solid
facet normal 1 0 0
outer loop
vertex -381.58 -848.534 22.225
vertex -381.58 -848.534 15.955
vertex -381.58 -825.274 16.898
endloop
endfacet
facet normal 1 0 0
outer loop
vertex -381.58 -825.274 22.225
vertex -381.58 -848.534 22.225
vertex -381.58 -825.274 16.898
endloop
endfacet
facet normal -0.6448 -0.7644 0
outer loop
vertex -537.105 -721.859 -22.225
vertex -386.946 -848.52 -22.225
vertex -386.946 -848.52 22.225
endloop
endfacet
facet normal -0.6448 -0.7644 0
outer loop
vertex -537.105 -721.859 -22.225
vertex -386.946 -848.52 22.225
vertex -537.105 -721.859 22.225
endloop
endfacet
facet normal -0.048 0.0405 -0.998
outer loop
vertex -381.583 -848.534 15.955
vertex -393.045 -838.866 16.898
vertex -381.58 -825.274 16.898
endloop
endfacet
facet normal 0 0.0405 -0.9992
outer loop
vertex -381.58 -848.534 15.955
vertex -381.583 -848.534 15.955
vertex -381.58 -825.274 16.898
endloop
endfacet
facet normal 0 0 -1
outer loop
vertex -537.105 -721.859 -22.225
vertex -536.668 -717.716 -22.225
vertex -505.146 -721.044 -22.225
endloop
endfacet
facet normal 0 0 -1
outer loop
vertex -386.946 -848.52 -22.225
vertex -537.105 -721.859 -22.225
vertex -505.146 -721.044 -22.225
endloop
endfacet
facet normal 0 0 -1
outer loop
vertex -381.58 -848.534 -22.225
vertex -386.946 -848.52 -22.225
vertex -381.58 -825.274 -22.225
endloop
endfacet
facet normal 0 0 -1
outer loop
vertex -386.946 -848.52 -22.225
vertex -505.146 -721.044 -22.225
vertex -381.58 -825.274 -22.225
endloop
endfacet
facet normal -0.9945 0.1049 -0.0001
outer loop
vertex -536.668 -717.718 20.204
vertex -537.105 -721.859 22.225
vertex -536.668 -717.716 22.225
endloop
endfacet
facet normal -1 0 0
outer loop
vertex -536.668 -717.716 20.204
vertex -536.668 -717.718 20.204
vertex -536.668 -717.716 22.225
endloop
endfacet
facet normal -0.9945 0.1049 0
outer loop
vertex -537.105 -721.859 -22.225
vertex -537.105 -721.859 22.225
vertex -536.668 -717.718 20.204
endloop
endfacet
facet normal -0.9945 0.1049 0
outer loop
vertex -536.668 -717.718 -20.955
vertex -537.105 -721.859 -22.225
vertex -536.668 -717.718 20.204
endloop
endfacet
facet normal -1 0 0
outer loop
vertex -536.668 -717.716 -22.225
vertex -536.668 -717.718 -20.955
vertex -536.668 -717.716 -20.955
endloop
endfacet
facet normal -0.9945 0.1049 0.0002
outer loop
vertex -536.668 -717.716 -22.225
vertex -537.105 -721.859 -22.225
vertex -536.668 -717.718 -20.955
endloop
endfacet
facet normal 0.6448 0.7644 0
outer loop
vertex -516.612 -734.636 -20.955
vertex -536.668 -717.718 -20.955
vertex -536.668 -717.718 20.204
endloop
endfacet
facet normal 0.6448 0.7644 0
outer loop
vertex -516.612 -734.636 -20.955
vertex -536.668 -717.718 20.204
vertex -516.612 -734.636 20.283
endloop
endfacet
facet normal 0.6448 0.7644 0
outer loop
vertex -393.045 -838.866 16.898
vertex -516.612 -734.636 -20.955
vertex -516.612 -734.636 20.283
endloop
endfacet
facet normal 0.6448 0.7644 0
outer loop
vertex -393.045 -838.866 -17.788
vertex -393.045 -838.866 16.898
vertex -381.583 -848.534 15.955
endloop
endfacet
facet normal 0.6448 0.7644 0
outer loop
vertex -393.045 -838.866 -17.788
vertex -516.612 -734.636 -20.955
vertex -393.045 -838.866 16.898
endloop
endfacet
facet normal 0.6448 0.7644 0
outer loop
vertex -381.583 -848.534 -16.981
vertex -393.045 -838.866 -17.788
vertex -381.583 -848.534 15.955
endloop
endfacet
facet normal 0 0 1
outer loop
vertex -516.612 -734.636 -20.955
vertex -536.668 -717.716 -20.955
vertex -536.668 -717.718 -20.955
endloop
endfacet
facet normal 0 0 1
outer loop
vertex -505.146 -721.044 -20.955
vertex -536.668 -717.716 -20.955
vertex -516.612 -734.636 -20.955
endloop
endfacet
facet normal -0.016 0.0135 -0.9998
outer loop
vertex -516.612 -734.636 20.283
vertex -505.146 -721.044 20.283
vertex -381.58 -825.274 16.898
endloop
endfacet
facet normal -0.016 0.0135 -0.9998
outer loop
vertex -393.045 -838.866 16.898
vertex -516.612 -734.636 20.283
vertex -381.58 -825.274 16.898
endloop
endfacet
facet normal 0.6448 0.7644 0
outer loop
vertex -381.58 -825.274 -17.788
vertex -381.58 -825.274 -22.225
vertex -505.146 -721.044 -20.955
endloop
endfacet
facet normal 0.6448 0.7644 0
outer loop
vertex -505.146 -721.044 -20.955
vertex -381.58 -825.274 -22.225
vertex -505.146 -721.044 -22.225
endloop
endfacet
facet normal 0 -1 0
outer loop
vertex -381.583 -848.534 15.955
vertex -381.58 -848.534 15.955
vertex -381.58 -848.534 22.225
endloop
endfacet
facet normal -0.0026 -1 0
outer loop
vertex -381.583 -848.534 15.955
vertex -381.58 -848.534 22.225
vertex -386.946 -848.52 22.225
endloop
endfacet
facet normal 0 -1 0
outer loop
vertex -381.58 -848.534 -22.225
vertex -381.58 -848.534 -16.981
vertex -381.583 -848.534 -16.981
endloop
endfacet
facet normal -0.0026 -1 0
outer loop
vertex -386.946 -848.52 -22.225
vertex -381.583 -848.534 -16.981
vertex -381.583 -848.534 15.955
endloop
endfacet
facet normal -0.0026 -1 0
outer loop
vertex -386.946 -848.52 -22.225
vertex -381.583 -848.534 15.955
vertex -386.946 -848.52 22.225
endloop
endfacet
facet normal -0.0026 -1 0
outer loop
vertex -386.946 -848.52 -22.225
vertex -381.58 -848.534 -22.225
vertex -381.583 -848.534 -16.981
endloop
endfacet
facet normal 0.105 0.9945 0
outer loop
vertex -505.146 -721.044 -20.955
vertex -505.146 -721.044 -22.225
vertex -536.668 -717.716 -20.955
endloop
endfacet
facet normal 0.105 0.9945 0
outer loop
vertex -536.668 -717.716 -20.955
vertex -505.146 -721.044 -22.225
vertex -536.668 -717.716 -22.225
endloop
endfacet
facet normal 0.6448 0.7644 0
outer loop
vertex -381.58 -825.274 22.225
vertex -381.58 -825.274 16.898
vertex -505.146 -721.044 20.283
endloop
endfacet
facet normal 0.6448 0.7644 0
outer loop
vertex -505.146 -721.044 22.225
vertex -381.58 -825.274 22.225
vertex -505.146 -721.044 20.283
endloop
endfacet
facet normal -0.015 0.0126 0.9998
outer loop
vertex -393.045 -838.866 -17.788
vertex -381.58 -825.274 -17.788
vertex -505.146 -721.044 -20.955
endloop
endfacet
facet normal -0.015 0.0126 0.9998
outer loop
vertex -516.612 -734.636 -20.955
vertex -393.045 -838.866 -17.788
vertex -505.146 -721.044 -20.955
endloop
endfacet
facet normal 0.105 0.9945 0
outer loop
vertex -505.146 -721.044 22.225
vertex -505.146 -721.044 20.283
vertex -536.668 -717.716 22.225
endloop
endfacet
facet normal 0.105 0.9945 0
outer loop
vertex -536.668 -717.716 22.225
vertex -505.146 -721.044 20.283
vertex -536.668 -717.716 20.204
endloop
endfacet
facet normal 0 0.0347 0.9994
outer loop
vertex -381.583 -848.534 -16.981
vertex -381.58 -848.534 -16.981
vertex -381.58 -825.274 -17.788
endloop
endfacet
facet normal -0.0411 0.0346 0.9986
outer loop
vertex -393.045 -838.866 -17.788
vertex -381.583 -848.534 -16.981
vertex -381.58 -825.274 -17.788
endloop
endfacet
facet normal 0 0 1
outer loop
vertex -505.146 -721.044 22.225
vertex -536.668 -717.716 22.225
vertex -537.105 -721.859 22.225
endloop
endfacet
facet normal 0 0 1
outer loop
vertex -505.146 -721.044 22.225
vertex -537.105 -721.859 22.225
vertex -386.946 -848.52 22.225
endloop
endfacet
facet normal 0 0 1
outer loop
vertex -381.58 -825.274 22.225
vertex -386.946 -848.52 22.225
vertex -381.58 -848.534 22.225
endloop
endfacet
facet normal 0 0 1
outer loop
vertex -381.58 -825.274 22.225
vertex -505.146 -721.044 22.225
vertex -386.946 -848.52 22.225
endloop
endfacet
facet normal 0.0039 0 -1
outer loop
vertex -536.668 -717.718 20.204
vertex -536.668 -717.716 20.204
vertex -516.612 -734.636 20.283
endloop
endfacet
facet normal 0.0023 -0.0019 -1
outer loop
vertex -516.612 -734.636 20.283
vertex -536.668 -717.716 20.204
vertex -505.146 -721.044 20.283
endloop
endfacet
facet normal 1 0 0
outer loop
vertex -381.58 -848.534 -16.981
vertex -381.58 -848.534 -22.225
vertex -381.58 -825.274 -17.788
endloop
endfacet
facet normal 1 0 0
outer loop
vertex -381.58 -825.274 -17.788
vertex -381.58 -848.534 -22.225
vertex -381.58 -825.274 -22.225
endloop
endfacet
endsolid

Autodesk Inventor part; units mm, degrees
ref_plane "YZ Plane" through (0, 0, 0) normal (1, 0, 0) x (0, 1, 0)
ref_plane "XZ Plane" through (0, 0, 0) normal (0, 1, 0) x (-1, 0, 0)
sketch "Sketch1" plane through (0, 0, 0) normal (0, 0, 1) x (1, 0, 0)
  line L0 (-381.58, -848.5343) -> (-381.58, -825.2737)
  line L1 (-381.58, -825.2737) -> (-505.1463, -721.0439)
  line L2 (-505.1463, -721.0439) -> (-536.6679, -717.7157)
  line L3 (-381.58, -848.5343) -> (-386.946, -848.5205)
  line L4 (-386.946, -848.5205) -> (-537.1054, -721.8591)
  line L5 (-537.1054, -721.8591) -> (-536.6679, -717.7157)
  line L6 (-381.58, -848.5343) -> (-536.6679, -717.7157) construction
  point P0 (0, 0)
extrude "Extrusion1" add sketch "Sketch1" along normal mid plane 44.45
sketch "Sketch2" plane through (-505.1463, -721.0439, 22.225) normal (0.6447648, 0.764381, 0) x (0.764381, -0.6447648, 0)
  line L0 (0, 1.9422) -> (161.6554, 5.3274) projected
  line L1 (161.6554, 40.0134) -> (0, 43.18) projected
  line L2 (161.6554, 5.3274) -> (176.6531, 6.2699) projected
  line L3 (176.6531, 39.2056) -> (161.6554, 40.0134) projected
  line L4 (-26.2404, 2.0211) -> (0, 1.9422) projected
  line L5 (-26.2404, 43.18) -> (0, 43.18) projected
  line L6 (176.6531, 6.2699) -> (176.6531, 39.2056)
  line L7 (176.6531, 44.45) -> (176.6531, 0) projected
  line L8 (-26.2404, 2.0211) -> (-26.2404, 43.18)
  point P0 (-78.7795, 22.225)
ref_plane "Work Plane1" through (-511.6606, -738.8097, -32.3222) normal (-0.6447648, -0.764381, 0) x (0.764381, -0.6447648, 0)
extrude "Extrusion2" cut sketch "Sketch2" against normal up to surface (17.78 mm away)
properties part number "TopGrip"
